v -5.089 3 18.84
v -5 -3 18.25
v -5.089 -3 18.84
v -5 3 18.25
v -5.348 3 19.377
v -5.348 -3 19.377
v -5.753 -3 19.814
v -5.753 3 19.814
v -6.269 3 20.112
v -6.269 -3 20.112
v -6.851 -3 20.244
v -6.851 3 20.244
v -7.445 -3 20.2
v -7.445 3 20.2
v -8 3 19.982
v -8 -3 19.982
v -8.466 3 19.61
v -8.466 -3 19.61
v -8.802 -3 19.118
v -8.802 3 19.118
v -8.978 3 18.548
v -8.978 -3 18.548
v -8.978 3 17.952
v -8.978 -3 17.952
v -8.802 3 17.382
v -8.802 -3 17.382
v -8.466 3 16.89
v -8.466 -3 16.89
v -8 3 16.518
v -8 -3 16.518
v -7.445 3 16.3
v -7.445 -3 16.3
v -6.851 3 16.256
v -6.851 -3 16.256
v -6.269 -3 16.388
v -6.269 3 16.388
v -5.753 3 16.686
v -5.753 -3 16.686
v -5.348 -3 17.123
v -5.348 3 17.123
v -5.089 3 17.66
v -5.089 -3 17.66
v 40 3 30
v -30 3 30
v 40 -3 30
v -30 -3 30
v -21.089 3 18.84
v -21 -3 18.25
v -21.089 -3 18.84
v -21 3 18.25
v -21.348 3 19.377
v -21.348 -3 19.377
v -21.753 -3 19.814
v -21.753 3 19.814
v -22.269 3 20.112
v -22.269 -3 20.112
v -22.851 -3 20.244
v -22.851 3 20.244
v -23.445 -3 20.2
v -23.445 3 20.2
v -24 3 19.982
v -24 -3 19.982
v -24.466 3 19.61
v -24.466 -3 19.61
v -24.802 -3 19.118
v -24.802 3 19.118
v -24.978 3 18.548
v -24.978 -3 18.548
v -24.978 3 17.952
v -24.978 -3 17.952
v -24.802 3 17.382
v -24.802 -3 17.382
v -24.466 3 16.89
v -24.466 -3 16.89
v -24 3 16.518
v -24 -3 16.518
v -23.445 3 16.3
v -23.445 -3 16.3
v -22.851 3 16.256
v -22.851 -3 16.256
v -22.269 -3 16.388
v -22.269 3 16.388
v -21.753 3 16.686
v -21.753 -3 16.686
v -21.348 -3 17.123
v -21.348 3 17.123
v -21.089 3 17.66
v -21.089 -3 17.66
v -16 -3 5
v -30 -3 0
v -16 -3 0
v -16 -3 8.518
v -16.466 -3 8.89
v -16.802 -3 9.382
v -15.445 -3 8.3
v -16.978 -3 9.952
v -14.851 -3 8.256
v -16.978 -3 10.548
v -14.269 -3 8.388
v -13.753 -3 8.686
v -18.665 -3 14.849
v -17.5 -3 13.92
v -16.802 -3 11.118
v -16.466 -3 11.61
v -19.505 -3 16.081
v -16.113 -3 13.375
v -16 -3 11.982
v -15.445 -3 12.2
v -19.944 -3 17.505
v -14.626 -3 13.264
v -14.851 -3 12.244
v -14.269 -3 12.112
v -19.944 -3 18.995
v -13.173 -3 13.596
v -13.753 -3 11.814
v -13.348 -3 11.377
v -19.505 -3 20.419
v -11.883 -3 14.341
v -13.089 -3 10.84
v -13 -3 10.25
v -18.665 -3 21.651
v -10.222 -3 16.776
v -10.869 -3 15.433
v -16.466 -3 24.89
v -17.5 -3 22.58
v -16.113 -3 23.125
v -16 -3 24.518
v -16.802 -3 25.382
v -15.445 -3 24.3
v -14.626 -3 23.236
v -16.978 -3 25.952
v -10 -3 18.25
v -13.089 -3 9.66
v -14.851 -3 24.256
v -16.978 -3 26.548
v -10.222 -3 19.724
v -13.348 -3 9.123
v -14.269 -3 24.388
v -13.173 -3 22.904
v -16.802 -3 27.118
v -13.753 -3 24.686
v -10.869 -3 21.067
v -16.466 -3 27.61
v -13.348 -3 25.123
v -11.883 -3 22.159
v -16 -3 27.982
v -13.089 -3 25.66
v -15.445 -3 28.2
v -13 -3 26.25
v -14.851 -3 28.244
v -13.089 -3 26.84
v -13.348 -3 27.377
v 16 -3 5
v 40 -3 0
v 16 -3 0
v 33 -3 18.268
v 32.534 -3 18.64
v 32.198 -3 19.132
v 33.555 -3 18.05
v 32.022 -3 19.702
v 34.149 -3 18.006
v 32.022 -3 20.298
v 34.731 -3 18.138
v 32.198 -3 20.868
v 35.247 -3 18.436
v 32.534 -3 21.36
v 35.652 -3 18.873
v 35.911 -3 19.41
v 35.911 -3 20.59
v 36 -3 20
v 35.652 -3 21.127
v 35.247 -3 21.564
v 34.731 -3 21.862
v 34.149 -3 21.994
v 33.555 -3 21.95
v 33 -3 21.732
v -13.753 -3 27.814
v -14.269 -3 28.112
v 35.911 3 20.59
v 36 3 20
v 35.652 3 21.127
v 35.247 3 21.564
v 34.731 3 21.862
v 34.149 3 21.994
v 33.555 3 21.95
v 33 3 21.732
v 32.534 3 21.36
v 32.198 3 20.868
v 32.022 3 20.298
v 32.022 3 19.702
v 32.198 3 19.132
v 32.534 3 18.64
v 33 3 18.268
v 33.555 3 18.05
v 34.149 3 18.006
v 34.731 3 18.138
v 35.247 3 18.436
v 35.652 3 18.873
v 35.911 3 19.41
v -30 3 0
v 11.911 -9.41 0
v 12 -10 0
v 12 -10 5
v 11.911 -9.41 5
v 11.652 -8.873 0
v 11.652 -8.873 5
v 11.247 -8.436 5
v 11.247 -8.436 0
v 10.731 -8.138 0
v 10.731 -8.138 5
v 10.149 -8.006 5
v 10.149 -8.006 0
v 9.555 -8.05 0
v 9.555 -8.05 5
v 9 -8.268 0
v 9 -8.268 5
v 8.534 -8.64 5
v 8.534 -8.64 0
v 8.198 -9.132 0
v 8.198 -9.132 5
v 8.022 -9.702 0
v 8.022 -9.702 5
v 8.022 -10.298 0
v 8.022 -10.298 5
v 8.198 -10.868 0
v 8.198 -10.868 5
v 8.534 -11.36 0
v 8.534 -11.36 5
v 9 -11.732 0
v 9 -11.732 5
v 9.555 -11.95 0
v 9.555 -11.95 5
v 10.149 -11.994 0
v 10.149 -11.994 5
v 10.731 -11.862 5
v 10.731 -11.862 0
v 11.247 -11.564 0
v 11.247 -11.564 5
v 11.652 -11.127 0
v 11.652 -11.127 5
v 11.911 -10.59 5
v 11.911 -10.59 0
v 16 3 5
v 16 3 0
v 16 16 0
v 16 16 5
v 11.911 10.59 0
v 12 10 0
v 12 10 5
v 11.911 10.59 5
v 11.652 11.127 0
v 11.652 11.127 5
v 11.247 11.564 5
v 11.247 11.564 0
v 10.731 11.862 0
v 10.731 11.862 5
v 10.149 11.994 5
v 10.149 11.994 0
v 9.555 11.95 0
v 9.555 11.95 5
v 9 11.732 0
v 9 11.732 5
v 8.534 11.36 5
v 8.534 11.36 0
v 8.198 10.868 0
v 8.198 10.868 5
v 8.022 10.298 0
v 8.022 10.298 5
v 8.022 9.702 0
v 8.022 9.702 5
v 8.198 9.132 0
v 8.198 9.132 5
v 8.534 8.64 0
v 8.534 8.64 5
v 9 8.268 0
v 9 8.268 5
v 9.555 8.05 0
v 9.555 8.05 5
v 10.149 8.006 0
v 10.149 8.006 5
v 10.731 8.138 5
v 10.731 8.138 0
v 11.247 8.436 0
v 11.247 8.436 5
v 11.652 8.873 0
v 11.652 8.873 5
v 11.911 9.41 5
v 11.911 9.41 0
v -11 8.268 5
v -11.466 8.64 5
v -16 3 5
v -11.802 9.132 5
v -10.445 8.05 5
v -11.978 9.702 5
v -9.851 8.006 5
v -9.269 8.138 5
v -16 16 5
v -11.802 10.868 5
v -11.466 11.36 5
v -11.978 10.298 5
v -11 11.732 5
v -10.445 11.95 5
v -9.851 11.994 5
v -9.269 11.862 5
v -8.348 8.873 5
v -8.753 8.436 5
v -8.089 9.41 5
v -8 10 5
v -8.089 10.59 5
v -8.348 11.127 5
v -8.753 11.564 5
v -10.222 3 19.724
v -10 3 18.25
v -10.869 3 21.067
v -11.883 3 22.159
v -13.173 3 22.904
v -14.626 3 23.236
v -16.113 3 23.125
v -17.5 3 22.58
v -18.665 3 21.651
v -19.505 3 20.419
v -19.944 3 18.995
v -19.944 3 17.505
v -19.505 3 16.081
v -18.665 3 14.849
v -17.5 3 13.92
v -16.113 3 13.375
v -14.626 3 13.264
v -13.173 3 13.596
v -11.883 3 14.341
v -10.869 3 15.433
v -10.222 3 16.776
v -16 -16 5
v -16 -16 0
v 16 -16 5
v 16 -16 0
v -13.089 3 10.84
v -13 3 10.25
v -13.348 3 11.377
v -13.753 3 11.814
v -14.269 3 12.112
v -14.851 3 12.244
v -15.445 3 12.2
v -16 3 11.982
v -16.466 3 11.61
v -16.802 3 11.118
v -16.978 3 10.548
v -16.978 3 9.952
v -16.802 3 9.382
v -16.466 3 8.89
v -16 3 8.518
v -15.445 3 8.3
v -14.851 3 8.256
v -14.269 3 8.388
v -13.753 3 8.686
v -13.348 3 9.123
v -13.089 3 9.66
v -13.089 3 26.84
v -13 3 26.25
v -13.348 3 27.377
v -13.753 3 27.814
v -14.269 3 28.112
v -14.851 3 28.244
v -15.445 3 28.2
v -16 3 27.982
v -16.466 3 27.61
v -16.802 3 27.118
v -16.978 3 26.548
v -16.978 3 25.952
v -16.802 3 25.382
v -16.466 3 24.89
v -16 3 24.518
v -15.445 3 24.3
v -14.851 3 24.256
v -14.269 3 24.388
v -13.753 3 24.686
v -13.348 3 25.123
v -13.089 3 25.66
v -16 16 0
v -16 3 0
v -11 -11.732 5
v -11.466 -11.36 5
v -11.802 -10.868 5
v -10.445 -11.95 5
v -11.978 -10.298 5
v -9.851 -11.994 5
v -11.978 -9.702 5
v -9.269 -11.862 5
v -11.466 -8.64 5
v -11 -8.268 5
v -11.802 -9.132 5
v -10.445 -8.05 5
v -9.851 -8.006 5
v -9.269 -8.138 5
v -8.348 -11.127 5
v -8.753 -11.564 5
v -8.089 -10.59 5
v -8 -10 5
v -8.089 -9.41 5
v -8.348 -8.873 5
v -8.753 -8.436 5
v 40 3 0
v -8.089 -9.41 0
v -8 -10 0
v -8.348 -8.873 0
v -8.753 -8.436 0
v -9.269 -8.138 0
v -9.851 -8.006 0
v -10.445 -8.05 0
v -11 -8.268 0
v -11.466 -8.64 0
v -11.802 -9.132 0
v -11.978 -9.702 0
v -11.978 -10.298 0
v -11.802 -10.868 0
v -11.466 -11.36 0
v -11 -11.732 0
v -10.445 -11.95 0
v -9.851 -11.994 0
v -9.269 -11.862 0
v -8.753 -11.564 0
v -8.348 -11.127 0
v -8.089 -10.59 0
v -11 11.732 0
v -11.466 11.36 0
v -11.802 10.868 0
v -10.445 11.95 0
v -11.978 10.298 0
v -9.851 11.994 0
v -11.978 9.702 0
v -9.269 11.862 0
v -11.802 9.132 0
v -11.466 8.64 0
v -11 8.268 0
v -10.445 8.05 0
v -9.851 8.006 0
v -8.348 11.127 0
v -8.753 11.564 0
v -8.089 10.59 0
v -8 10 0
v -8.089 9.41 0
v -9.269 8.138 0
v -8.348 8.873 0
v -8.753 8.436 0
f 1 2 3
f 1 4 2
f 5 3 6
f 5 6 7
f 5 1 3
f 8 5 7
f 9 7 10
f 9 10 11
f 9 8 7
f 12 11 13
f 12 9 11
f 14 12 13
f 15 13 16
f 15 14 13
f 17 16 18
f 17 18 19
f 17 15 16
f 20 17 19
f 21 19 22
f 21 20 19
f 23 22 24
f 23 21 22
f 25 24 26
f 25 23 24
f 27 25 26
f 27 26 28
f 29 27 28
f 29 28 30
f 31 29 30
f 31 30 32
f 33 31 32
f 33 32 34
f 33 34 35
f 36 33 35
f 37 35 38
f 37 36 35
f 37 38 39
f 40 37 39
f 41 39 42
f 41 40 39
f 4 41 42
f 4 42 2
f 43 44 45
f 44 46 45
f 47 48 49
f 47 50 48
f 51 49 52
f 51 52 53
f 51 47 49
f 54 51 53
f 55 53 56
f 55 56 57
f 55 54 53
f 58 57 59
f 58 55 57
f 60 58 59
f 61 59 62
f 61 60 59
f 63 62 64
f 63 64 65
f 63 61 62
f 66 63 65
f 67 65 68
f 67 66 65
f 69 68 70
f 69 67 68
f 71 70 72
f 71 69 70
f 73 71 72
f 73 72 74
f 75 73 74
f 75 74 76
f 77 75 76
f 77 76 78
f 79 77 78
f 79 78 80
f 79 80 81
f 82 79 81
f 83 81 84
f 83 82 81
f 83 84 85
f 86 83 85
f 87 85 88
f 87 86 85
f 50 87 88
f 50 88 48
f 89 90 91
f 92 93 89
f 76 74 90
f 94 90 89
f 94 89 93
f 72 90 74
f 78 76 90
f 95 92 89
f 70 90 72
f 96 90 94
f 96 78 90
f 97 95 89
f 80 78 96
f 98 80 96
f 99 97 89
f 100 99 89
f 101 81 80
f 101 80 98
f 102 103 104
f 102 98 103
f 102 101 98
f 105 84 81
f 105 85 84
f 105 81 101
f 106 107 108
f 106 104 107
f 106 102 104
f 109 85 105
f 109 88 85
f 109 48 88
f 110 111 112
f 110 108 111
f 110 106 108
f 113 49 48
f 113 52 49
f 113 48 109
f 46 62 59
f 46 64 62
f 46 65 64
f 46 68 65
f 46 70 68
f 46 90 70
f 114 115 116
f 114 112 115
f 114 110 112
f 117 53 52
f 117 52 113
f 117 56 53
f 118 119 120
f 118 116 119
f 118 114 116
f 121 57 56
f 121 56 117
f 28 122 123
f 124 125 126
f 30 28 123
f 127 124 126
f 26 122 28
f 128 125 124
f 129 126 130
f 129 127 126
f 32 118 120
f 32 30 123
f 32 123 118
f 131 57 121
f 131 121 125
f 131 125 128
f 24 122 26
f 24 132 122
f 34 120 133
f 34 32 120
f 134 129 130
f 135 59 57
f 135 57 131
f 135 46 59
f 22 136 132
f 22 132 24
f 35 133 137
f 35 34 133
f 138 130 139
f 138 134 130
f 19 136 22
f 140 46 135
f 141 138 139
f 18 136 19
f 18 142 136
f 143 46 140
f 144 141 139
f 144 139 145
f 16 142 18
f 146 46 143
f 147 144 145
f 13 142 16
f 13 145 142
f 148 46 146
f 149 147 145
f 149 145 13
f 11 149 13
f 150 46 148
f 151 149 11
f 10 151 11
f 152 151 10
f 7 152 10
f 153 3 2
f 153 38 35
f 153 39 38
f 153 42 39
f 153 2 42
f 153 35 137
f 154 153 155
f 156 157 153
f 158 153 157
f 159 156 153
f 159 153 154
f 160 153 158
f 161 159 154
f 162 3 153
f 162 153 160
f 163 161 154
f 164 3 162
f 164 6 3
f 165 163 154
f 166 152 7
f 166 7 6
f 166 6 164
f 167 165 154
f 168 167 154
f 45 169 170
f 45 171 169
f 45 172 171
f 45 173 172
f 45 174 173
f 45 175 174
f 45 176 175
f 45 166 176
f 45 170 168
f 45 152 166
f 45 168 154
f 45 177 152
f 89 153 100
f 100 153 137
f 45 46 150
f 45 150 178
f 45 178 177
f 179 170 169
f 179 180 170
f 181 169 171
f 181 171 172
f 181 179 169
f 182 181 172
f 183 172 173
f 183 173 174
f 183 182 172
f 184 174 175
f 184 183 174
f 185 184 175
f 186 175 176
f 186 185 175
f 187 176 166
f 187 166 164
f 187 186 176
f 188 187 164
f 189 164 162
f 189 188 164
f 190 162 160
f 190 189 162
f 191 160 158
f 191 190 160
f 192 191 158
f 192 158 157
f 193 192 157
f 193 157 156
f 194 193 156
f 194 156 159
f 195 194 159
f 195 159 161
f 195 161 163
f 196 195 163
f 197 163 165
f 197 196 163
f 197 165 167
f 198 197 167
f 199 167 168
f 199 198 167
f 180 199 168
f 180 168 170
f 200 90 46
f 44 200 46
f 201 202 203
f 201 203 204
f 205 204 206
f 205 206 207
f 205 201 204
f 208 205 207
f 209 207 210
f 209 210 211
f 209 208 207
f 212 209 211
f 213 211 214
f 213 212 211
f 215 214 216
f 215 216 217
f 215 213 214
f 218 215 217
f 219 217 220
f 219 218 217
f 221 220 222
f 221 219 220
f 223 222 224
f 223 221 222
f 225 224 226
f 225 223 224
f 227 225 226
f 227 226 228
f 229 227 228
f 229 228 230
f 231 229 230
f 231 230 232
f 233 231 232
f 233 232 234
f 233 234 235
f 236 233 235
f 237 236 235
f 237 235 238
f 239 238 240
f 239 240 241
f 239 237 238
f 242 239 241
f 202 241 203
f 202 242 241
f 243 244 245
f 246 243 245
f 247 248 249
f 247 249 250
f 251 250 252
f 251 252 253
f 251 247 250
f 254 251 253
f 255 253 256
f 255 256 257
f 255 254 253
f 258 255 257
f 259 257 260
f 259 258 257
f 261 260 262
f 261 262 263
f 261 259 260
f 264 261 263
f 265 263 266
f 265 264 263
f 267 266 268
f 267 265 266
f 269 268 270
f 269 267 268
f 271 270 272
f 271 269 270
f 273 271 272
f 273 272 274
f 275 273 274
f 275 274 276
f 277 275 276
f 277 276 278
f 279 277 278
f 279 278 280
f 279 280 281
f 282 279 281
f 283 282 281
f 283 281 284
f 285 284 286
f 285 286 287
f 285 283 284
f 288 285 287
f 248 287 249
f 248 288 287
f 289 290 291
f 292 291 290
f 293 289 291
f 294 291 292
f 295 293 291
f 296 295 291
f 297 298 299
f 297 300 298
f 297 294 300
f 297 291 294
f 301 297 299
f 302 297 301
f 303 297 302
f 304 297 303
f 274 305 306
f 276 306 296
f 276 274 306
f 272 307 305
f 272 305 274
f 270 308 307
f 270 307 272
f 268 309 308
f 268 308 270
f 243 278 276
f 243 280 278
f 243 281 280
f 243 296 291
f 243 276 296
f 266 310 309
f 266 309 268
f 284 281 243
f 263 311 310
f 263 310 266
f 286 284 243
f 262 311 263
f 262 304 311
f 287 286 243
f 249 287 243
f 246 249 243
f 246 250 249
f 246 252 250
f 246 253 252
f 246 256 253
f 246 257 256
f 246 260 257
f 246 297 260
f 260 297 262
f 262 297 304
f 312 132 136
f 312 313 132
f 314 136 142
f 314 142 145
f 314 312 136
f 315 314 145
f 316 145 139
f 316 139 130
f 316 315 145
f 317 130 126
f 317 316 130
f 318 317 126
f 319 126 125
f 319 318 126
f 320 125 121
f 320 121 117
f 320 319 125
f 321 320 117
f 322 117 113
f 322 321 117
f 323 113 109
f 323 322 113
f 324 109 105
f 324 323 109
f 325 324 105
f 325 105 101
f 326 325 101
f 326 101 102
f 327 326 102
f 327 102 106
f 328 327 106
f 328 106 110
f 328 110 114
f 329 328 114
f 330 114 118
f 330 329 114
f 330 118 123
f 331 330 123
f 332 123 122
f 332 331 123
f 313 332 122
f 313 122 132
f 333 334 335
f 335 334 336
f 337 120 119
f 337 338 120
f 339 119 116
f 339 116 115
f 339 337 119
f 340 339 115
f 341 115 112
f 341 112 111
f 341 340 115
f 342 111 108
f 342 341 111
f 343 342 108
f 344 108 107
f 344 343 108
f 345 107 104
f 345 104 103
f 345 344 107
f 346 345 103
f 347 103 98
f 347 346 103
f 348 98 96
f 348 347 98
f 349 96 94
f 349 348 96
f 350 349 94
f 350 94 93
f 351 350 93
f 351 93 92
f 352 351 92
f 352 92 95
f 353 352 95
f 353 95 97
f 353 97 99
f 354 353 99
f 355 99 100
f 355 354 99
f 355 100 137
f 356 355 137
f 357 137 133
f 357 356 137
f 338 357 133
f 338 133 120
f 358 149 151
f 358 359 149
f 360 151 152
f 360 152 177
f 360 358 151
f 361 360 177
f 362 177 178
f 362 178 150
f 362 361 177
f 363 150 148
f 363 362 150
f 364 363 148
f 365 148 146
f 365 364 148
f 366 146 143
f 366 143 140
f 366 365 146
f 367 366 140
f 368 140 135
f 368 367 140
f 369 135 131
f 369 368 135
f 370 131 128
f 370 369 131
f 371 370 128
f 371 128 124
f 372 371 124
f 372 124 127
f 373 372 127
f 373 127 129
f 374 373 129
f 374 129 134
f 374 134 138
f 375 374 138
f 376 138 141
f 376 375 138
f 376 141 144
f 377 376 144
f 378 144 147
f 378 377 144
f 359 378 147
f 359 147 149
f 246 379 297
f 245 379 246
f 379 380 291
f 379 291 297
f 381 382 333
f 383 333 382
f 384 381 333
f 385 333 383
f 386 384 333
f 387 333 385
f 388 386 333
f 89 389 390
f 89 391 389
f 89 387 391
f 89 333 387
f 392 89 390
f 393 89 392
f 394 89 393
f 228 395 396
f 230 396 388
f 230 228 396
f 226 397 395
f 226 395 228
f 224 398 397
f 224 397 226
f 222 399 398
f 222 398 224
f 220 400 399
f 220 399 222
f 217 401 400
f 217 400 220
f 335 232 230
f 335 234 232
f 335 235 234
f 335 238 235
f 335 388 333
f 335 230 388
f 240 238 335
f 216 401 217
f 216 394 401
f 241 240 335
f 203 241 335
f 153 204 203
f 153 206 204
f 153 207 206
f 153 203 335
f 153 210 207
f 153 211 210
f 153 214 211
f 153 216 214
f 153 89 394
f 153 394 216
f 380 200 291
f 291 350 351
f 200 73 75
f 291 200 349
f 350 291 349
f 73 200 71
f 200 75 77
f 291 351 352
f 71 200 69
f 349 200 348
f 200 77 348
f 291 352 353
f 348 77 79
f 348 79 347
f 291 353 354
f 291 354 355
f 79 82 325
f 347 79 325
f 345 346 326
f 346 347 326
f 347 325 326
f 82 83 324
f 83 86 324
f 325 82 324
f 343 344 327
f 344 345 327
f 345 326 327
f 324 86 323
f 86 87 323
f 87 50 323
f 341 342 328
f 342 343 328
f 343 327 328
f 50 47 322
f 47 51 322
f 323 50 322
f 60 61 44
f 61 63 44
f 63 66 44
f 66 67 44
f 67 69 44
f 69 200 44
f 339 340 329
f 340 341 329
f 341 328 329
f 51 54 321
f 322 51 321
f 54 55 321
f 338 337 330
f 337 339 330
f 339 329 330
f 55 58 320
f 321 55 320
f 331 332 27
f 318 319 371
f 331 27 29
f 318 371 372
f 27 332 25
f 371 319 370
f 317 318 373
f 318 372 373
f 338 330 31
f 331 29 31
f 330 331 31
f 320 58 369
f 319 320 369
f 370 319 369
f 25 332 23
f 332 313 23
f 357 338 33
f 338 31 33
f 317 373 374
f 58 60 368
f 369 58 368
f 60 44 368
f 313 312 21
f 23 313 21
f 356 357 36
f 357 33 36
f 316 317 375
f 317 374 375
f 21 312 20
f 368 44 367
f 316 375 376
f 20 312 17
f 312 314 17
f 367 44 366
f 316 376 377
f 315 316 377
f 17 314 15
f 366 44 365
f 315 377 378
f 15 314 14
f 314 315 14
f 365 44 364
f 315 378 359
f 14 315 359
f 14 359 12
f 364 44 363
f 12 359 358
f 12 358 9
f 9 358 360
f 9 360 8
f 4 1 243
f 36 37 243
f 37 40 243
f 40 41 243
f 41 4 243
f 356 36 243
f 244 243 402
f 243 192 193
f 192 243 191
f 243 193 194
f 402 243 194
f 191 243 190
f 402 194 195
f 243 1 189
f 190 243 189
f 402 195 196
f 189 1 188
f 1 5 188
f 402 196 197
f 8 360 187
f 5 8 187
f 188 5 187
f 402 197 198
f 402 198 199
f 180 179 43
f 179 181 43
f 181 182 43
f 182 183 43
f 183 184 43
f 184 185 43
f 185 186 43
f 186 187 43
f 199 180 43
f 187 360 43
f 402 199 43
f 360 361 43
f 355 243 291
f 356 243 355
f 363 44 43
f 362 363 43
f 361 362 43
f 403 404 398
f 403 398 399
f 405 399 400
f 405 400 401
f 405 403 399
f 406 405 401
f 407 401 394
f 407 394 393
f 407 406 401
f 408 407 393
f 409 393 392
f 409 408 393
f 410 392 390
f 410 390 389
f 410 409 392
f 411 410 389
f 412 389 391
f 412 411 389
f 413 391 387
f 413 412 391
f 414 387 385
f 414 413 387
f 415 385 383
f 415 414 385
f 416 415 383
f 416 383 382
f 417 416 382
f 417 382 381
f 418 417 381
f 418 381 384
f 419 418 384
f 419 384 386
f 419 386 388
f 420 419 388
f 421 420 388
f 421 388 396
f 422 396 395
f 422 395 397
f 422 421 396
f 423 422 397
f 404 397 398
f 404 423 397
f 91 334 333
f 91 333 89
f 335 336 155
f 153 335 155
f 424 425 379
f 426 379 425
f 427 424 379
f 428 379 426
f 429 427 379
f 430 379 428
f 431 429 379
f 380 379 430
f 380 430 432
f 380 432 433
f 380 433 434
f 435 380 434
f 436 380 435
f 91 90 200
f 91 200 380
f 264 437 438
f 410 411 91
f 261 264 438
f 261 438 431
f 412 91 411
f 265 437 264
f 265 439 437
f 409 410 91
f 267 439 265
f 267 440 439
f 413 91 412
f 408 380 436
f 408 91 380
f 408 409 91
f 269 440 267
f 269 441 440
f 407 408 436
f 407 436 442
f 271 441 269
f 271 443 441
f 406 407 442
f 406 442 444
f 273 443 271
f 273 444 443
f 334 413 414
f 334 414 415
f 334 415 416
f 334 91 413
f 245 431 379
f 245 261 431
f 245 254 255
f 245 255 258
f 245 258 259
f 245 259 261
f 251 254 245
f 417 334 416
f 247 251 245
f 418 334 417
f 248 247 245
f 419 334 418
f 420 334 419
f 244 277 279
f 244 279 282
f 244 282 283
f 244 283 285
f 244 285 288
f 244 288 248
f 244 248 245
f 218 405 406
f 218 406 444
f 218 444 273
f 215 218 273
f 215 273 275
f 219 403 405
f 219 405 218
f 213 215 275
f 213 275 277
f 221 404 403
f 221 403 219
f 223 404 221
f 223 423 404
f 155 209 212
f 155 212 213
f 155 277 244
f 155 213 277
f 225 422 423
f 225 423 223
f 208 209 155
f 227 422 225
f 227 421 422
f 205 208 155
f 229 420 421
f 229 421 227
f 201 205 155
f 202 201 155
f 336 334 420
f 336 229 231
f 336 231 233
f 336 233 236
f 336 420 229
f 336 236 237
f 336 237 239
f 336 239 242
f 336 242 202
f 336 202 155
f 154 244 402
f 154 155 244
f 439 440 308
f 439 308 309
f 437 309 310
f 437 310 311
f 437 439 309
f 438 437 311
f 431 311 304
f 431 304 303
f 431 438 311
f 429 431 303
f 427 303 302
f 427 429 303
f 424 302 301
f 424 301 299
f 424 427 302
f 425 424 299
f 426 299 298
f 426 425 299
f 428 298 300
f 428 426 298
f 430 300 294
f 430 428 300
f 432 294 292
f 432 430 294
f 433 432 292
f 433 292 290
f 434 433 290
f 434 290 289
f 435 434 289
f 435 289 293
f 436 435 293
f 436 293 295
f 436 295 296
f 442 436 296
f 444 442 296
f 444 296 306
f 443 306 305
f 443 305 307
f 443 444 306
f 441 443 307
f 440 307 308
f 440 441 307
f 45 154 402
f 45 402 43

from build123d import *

# Parameters (mm, degrees)
F0_W     = 32
F0_H     = 32
F0_R     = 2
F1_DEPTH = 5
F2_W     = 70
F2_H     = 30
F2_R     = 2
F2_R_2   = 5
F3_DEPTH = 3


with BuildPart() as f1:
    # F0 (on Top) → F1 (new body)
    with BuildSketch(Plane.XY):
        Rectangle(F0_W, F0_H)
        with Locations((-10, -10)):
            Circle(F0_R, mode=Mode.SUBTRACT)
        with Locations((10, -10)):
            Circle(F0_R, mode=Mode.SUBTRACT)
        with Locations((-10, 10)):
            Circle(F0_R, mode=Mode.SUBTRACT)
        with Locations((10, 10)):
            Circle(F0_R, mode=Mode.SUBTRACT)
    extrude(amount=F1_DEPTH)

    # F2 (on Front) → F3 (join, symmetric)
    with BuildSketch(Plane.XZ):
        with Locations((5, 15)):
            Rectangle(F2_W, F2_H)
        with Locations((-15, 10.25)):
            Circle(F2_R, mode=Mode.SUBTRACT)
        with Locations((-23, 18.25)):
            Circle(F2_R, mode=Mode.SUBTRACT)
        with Locations((-15, 18.25)):
            Circle(F2_R_2, mode=Mode.SUBTRACT)
        with Locations((-7, 18.25)):
            Circle(F2_R, mode=Mode.SUBTRACT)
        with Locations((-15, 26.25)):
            Circle(F2_R, mode=Mode.SUBTRACT)
        with Locations((34, 20)):
            Circle(F2_R, mode=Mode.SUBTRACT)
    extrude(amount=F3_DEPTH, both=True)


solid = f1.part
